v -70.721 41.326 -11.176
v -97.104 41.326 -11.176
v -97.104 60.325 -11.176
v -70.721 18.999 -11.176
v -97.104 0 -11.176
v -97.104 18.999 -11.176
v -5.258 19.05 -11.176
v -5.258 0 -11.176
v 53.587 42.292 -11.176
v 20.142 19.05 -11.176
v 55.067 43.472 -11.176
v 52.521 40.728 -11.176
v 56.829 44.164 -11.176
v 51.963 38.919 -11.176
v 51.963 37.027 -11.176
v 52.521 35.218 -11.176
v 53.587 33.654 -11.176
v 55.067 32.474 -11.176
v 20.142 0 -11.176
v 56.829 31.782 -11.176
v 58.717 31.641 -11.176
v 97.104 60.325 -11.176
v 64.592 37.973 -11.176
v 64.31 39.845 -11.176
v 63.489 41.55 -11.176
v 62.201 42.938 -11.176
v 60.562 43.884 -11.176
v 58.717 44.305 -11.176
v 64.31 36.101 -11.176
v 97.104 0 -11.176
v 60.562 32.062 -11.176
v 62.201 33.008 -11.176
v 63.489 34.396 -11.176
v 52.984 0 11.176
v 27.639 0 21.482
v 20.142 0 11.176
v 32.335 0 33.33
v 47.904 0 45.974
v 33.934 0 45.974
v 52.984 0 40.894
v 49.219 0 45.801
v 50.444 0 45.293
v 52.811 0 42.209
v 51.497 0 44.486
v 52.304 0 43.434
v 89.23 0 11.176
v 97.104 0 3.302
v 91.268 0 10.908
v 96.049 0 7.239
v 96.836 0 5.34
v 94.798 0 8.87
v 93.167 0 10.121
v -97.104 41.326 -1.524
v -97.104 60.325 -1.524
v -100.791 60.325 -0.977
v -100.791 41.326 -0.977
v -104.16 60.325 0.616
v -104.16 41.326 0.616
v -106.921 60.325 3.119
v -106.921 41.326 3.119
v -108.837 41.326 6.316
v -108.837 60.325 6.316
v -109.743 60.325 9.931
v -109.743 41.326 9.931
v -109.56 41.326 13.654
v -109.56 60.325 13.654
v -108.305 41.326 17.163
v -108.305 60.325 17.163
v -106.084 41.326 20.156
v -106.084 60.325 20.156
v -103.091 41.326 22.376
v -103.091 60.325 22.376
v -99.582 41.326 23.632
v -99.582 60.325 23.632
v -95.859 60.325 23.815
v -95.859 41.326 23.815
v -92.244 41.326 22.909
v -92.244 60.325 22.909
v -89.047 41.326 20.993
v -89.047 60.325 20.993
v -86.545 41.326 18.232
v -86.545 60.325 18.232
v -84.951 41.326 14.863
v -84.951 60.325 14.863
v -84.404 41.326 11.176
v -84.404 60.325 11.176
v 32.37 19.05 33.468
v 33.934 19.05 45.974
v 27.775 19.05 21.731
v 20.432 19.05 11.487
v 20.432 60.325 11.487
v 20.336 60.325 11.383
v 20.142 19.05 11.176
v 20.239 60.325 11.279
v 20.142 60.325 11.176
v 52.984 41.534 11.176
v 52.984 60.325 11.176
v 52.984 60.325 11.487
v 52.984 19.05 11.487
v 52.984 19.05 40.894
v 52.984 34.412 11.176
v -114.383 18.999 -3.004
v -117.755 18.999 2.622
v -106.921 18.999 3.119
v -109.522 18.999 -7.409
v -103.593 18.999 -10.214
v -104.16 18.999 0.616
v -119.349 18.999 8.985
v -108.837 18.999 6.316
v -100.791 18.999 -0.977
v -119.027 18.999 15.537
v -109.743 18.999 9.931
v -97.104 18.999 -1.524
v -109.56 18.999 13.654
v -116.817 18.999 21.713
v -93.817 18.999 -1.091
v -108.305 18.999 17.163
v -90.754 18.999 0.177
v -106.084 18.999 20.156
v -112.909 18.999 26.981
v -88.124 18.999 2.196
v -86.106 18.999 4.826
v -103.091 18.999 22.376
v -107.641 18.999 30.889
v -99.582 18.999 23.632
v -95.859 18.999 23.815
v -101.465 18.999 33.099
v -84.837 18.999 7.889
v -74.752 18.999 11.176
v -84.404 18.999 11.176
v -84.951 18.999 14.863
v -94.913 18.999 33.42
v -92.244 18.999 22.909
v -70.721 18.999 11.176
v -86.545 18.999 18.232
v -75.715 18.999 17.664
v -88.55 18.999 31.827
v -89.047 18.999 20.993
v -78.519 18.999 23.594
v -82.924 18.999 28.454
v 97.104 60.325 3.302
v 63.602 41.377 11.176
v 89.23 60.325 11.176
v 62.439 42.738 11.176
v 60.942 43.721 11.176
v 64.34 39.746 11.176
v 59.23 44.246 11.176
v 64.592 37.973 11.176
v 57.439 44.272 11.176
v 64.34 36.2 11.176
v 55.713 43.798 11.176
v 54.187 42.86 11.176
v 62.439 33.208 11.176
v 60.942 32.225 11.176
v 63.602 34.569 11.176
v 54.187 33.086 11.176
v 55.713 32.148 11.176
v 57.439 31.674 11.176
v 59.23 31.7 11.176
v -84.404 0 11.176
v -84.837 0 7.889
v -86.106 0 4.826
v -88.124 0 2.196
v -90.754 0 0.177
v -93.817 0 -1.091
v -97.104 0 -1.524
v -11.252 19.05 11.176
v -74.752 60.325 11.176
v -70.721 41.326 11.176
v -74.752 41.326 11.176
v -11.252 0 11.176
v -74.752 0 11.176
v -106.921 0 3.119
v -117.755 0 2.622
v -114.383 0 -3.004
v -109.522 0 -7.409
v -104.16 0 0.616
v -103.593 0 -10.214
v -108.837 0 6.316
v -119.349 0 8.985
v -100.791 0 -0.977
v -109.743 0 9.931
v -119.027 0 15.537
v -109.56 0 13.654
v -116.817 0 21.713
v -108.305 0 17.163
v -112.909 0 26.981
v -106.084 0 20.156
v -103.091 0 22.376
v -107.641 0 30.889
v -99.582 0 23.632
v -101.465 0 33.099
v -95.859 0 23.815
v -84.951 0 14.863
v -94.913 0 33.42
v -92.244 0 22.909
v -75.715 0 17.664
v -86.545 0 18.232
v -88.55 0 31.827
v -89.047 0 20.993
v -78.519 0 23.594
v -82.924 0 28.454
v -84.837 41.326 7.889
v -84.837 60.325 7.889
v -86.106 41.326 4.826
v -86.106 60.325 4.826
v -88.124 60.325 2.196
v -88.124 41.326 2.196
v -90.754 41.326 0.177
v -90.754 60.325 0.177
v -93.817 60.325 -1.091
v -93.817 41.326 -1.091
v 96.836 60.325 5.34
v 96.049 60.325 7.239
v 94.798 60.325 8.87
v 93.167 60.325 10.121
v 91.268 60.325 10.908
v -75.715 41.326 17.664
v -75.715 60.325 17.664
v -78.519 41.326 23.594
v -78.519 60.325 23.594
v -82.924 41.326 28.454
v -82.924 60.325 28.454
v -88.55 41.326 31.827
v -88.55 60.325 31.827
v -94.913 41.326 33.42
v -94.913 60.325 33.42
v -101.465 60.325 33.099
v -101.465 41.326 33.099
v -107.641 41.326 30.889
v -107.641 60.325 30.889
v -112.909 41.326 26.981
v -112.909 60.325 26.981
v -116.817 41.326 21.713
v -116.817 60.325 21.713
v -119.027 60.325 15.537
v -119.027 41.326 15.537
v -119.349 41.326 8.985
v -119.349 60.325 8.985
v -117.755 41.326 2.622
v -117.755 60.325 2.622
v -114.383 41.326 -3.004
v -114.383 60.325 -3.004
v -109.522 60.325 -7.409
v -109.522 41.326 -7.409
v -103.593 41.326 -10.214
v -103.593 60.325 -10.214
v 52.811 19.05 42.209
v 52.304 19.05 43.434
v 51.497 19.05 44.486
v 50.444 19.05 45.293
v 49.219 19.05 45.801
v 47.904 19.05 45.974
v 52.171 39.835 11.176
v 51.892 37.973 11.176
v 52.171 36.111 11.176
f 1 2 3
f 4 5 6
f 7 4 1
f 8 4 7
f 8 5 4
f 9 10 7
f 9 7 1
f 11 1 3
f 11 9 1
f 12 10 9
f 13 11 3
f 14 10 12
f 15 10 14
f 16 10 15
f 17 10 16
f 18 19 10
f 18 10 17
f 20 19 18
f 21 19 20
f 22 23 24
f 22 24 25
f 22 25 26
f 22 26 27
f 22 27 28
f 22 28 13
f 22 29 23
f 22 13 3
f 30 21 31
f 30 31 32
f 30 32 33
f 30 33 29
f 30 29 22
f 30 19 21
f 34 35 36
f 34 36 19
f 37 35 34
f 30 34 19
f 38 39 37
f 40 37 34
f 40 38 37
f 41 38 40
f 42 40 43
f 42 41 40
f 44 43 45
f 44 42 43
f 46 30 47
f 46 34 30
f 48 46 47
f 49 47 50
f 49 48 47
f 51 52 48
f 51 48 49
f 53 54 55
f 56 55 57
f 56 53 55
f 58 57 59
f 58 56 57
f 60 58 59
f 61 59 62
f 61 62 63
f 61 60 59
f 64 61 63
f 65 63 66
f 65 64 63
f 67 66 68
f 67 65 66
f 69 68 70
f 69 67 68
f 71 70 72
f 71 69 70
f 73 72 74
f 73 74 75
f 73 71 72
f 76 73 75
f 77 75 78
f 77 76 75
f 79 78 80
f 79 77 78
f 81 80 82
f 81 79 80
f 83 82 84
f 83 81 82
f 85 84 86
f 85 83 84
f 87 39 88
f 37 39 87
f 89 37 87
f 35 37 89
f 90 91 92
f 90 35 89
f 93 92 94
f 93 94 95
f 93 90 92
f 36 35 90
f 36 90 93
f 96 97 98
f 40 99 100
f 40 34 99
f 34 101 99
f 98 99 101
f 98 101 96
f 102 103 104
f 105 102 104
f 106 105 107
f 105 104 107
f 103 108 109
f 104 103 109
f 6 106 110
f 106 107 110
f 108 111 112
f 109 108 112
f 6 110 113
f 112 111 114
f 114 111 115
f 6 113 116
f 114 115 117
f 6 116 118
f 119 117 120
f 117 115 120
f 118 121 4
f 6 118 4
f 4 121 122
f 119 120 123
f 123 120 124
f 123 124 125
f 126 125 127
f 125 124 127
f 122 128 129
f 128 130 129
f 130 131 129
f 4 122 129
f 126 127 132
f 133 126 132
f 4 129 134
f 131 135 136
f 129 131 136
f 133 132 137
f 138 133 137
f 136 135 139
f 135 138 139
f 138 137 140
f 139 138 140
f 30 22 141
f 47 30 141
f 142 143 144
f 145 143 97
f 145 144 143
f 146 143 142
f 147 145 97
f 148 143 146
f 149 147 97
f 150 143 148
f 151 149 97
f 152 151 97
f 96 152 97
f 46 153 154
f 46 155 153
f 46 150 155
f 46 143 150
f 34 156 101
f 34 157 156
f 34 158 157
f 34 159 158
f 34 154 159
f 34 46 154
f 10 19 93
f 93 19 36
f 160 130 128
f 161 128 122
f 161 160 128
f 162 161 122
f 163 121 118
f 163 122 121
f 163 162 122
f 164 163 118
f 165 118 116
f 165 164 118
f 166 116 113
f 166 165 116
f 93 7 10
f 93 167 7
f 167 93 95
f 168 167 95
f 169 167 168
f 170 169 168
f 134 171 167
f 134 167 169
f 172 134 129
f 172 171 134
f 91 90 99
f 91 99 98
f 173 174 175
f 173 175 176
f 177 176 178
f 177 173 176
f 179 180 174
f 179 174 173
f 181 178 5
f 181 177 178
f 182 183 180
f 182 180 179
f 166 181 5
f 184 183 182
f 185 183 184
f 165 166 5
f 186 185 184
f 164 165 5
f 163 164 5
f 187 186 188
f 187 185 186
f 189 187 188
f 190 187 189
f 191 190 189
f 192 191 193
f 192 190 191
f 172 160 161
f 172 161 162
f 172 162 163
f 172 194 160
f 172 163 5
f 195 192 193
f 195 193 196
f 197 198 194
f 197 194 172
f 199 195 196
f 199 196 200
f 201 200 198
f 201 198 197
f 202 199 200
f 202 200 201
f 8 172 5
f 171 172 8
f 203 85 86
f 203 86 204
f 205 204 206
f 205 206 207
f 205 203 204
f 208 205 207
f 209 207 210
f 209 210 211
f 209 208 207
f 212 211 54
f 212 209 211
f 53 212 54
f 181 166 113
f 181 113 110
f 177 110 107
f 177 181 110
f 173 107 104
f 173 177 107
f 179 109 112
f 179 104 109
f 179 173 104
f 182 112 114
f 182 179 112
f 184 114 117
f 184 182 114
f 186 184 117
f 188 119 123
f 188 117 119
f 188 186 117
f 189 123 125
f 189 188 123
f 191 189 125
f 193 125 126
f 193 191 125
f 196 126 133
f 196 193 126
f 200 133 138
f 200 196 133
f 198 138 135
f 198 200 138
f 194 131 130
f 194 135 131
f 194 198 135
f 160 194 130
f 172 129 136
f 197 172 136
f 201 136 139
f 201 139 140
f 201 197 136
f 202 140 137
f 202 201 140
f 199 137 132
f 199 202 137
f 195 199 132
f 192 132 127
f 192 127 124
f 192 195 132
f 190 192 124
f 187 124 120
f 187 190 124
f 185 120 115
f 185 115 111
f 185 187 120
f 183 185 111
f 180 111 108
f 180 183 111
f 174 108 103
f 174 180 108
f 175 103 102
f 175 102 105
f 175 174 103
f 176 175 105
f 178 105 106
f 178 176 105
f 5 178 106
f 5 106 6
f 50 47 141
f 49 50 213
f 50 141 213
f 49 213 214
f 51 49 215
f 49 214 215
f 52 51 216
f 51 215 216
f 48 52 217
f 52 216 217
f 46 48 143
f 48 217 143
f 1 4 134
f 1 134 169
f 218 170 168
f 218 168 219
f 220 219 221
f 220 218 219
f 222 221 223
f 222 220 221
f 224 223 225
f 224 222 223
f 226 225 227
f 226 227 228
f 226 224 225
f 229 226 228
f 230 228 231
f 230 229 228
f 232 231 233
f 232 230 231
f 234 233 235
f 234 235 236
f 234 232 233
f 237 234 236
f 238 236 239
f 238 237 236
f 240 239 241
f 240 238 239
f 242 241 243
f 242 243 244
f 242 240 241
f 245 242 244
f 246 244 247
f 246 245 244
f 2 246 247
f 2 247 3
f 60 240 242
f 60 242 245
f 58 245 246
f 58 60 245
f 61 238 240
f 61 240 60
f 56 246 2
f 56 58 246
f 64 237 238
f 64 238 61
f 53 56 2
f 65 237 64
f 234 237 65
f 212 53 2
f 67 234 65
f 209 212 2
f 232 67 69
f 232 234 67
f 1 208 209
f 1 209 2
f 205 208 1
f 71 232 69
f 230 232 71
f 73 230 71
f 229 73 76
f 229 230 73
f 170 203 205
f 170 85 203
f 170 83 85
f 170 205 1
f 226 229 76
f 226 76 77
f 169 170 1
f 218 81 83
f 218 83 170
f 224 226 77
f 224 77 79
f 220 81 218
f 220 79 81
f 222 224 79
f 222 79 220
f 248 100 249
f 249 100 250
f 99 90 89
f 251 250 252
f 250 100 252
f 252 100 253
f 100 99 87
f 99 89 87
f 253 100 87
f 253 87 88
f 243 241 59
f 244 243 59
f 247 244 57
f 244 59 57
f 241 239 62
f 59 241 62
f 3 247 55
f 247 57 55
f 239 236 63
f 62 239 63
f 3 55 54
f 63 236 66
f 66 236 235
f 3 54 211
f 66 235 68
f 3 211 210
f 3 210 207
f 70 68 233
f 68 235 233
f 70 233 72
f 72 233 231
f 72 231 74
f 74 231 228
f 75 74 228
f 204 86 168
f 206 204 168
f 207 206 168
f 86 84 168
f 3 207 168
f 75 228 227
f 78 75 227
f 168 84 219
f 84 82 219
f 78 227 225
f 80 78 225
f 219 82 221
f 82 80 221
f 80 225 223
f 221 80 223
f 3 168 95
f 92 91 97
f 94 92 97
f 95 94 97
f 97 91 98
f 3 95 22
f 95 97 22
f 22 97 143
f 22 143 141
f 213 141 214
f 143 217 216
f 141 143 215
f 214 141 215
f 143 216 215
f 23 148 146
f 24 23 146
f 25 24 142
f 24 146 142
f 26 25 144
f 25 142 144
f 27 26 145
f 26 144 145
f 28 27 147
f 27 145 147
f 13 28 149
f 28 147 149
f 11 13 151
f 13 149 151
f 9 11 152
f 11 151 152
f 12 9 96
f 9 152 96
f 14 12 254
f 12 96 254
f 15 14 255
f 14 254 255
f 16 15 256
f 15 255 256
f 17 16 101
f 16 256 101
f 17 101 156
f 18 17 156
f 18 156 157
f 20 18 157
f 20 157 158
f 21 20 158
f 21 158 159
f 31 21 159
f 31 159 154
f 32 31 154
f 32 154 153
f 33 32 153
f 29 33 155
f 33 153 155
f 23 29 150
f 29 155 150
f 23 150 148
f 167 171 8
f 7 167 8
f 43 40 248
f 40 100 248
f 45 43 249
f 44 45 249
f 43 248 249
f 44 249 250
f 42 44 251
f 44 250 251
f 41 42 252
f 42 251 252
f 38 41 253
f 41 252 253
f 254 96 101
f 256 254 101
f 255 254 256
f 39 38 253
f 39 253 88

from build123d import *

# Parameters (mm, degrees)
F1_DEPTH  = 60.325
F2_W      = 53.0107717005
F2_H      = 22.3266
F3_DEPTH  = 44.2625842988
F4_W      = 41.91
F4_H      = 34.670740366
F5_DEPTH  = 77.503874898
F6_R      = 7.874
F7_R      = 5.08
F8_DEPTH  = 19.0500002354
F9_R      = 6.35
F10_DEPTH = 22.353


with BuildPart() as f1:
    # F0 (on Front) → F1 (new body)
    with BuildSketch(Plane.XZ):
        with BuildLine():
            Line((20.1422, -11.176), (97.1042, -11.176))
            Line((97.1042, -11.176), (97.1042, 11.176))
            Line((97.1042, 11.176), (52.9844, 11.176))
            Line((52.9844, 11.176), (52.9844, 45.974))
            Line((52.9844, 45.974), (33.9344, 45.974))
            ThreePointArc((33.9344, 45.974), (30.3602153616, 27.2583576341), (20.1422, 11.176))
            Line((20.1422, 11.176), (20.1422, -11.176))
        make_face()
        Polygon((-5.2578, -11.176), (20.1422, -11.176), (20.1422, 11.176), (-11.2522, 11.176), align=None)
        with BuildLine():
            Line((-97.1042, -11.176), (-5.2578, -11.176))
            Line((-5.2578, -11.176), (-11.2522, 11.176))
            Line((-11.2522, 11.176), (-74.7522, 11.176))
            ThreePointArc((-74.7522, 11.176), (-81.2989492269, -4.6292507731), (-97.1042, -11.176))
        make_face()
        with BuildLine():
            ThreePointArc((-74.7522, 11.176), (-112.9094507731, 26.9812507731), (-97.1042, -11.176))
            Line((-97.1042, -11.176), (-97.1042, -1.524))
            ThreePointArc((-97.1042, -1.524), (-106.0844561211, 20.1562561211), (-84.4042, 11.176))
            Line((-84.4042, 11.176), (-74.7522, 11.176))
        make_face()
        with BuildLine():
            Line((-97.1042, -1.524), (-97.1042, -11.176))
            ThreePointArc((-97.1042, -11.176), (-81.2989492269, -4.6292507731), (-74.7522, 11.176))
            Line((-74.7522, 11.176), (-84.4042, 11.176))
            ThreePointArc((-84.4042, 11.176), (-88.1239438789, 2.1957438789), (-97.1042, -1.524))
        make_face()
    extrude(amount=-F1_DEPTH)

    # F2 (on Top) → F3 (cut, symmetric)
    with BuildSketch(Plane.XY):
        with Locations((-97.226254642, 30.1625)):
            Rectangle(F2_W, F2_H)
    extrude(amount=F3_DEPTH, both=True, mode=Mode.SUBTRACT)

    # F4 (on Right) → F5 (cut)
    with BuildSketch(Plane.YZ):
        with Locations((40.005, 28.8226753473)):
            Rectangle(F4_W, F4_H)
    extrude(amount=F5_DEPTH, mode=Mode.SUBTRACT)

    # F6
    f6_edges = [f1.edges().sort_by_distance(p)[0] for p in [
        (97.1042, 30.1625, 11.176),
    ]]
    fillet(f6_edges, radius=F6_R)

    # F7
    f7_edges = [f1.edges().sort_by_distance(p)[0] for p in [
        (52.9844, 9.525, 45.974),
    ]]
    fillet(f7_edges, radius=F7_R)

    # F0 (on Front) → F8 (cut)
    with BuildSketch(Plane.XZ):
        Polygon((-5.2578, -11.176), (20.1422, -11.176), (20.1422, 11.176), (-11.2522, 11.176), align=None)
    extrude(amount=-F8_DEPTH, mode=Mode.SUBTRACT)

    # F9 (on face) → F10 (cut, through all)
    with BuildSketch(Plane.XY.offset(11.176)):
        with Locations((58.2422, 37.973)):
            Circle(F9_R)
    extrude(amount=-F10_DEPTH, mode=Mode.SUBTRACT)


solid = f1.part
